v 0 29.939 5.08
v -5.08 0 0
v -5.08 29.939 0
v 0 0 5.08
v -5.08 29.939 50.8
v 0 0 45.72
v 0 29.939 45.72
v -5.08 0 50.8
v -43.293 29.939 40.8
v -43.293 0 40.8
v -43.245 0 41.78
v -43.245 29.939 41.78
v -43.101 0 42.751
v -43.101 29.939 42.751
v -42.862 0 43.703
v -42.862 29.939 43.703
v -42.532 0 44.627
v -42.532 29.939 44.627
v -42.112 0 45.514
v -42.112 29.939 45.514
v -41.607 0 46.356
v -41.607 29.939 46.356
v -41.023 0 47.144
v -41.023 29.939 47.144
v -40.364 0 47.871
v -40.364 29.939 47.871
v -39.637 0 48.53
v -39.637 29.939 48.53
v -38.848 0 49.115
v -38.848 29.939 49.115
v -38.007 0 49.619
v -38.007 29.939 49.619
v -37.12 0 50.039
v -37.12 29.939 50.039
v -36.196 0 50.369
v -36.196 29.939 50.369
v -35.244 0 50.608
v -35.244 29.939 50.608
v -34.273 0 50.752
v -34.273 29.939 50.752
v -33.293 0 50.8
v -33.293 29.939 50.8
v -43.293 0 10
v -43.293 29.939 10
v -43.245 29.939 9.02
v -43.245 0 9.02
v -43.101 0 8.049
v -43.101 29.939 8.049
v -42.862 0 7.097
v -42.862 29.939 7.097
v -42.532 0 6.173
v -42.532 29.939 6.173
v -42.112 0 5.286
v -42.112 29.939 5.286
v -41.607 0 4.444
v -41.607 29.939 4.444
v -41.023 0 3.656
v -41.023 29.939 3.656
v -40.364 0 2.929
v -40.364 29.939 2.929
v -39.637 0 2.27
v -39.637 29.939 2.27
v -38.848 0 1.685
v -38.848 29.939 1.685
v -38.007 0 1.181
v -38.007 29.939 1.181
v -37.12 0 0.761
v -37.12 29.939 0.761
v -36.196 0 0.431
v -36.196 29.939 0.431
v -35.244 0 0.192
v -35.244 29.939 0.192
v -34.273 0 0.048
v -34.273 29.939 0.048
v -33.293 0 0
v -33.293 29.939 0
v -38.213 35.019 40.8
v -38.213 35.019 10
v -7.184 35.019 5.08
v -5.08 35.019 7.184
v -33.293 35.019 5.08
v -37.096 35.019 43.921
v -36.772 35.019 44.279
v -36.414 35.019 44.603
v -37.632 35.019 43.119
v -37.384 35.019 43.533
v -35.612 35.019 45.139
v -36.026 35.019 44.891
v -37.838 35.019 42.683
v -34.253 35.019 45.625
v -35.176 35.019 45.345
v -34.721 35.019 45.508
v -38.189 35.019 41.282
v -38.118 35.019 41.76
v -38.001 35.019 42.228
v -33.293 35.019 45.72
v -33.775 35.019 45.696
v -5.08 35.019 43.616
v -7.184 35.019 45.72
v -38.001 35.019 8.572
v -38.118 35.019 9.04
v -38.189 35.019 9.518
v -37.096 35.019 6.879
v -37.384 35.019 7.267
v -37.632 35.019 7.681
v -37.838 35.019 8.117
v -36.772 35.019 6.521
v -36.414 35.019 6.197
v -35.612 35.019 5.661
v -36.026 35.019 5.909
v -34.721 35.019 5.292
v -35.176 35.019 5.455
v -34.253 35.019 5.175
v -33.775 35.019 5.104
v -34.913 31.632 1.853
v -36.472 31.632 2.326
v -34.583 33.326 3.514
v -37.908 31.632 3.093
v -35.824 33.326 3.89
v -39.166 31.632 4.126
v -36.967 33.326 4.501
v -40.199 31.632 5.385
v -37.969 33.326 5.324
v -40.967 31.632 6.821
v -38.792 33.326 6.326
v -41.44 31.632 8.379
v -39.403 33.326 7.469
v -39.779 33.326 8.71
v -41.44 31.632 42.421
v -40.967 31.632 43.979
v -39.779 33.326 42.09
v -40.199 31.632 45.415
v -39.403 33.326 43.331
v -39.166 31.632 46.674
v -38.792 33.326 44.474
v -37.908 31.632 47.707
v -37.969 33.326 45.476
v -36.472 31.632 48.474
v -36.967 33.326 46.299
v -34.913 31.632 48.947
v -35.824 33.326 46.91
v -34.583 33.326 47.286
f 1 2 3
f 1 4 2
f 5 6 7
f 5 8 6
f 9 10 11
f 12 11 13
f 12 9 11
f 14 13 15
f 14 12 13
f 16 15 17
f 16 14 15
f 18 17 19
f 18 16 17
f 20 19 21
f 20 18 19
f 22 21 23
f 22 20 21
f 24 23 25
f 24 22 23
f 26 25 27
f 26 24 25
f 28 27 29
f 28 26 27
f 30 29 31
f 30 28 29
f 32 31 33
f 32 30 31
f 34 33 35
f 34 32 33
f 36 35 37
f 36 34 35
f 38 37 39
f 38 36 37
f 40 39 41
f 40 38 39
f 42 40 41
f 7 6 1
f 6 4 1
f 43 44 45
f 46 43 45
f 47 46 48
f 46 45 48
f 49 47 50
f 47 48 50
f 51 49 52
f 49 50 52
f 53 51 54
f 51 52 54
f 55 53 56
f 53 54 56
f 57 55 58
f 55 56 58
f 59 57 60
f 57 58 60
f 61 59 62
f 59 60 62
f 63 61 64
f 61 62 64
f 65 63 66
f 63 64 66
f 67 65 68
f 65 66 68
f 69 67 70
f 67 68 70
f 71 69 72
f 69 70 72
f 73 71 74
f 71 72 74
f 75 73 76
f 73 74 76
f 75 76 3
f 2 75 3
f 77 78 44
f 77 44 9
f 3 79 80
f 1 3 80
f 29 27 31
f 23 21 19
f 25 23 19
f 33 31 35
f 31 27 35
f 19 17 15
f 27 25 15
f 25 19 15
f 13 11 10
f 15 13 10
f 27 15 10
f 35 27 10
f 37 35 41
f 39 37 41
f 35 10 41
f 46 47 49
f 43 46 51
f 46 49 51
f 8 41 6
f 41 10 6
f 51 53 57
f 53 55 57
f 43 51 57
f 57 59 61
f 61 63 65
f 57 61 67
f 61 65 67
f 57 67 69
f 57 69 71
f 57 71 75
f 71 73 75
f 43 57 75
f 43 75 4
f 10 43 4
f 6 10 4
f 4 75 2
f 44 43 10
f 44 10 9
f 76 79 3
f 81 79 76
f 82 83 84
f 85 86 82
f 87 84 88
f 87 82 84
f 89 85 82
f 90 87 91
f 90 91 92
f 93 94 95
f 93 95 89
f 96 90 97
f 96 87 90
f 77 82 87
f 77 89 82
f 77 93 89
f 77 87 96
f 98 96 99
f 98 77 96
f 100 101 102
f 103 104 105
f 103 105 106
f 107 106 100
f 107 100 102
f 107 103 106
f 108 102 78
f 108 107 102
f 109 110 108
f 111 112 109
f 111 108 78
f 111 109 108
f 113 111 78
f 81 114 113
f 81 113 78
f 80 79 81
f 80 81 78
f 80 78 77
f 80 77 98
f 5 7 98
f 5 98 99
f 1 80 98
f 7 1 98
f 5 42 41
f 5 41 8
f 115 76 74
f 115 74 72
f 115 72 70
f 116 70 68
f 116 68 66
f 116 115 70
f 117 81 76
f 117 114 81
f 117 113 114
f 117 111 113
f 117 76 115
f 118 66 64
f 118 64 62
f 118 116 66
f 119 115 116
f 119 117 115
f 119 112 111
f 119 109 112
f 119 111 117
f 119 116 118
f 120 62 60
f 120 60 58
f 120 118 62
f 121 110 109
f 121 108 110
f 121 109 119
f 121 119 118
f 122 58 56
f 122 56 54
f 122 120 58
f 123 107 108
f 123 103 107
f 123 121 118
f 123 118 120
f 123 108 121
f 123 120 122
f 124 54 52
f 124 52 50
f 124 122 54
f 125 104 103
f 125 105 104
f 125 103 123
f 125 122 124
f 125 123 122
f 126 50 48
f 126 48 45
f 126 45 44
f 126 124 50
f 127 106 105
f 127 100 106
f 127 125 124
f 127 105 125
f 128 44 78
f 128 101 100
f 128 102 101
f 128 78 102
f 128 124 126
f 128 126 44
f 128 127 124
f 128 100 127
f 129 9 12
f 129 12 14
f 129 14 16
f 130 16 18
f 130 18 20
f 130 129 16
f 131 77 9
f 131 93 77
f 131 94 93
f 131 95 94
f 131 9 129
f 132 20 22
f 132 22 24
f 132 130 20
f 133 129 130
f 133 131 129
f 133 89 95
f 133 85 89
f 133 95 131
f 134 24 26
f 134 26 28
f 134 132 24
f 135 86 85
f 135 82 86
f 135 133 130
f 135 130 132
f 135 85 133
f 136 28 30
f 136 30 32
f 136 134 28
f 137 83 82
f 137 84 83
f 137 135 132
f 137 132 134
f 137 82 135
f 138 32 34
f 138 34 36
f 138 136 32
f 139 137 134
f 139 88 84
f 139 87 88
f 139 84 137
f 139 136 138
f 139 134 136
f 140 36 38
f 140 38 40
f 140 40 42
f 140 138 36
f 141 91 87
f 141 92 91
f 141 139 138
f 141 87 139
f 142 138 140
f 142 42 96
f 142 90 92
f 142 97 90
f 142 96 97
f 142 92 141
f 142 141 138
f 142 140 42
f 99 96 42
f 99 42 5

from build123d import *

# Parameters (mm, degrees)
F0_W     = 43.2927459478
F0_H     = 35.019159317
F1_DEPTH = 50.8
F2_R     = 10
F3_R     = 10
F4_SIZE  = 5.08
F5_SIZE  = 5.08
F6_SIZE  = 5.08


with BuildPart() as f1:
    # F0 (on Top) → F1 (new body)
    with BuildSketch(Plane.XY):
        with Locations((-21.6463729739, 17.5095796585)):
            Rectangle(F0_W, F0_H)
    extrude(amount=F1_DEPTH)

    # F2
    f2_edges = [f1.edges().sort_by_distance(p)[0] for p in [
        (-43.292746, 17.50958, 50.8),
    ]]
    fillet(f2_edges, radius=F2_R)

    # F3
    f3_edges = [f1.edges().sort_by_distance(p)[0] for p in [
        (-43.292746, 17.50958, 0),
    ]]
    fillet(f3_edges, radius=F3_R)

    # F4
    f4_edges = [f1.edges().sort_by_distance(p)[0] for p in [
        (0, 17.50958, 0),
    ]]
    chamfer(f4_edges, length=F4_SIZE)

    # F5
    f5_edges = [f1.edges().sort_by_distance(p)[0] for p in [
        (0, 17.50958, 50.8),
    ]]
    chamfer(f5_edges, length=F5_SIZE)

    # F6
    f6_edges = [f1.edges().sort_by_distance(p)[0] for p in [
        (-2.54, 35.019159, 2.54),
        (-19.186373, 35.019159, 50.8),
        (0, 35.019159, 25.4),
        (-40.363814, 35.019159, 47.871068),
        (-19.186373, 35.019159, 0),
        (-2.54, 35.019159, 48.26),
        (-40.363814, 35.019159, 2.928932),
        (-43.292746, 35.019159, 25.4),
    ]]
    chamfer(f6_edges, length=F6_SIZE)


solid = f1.part
